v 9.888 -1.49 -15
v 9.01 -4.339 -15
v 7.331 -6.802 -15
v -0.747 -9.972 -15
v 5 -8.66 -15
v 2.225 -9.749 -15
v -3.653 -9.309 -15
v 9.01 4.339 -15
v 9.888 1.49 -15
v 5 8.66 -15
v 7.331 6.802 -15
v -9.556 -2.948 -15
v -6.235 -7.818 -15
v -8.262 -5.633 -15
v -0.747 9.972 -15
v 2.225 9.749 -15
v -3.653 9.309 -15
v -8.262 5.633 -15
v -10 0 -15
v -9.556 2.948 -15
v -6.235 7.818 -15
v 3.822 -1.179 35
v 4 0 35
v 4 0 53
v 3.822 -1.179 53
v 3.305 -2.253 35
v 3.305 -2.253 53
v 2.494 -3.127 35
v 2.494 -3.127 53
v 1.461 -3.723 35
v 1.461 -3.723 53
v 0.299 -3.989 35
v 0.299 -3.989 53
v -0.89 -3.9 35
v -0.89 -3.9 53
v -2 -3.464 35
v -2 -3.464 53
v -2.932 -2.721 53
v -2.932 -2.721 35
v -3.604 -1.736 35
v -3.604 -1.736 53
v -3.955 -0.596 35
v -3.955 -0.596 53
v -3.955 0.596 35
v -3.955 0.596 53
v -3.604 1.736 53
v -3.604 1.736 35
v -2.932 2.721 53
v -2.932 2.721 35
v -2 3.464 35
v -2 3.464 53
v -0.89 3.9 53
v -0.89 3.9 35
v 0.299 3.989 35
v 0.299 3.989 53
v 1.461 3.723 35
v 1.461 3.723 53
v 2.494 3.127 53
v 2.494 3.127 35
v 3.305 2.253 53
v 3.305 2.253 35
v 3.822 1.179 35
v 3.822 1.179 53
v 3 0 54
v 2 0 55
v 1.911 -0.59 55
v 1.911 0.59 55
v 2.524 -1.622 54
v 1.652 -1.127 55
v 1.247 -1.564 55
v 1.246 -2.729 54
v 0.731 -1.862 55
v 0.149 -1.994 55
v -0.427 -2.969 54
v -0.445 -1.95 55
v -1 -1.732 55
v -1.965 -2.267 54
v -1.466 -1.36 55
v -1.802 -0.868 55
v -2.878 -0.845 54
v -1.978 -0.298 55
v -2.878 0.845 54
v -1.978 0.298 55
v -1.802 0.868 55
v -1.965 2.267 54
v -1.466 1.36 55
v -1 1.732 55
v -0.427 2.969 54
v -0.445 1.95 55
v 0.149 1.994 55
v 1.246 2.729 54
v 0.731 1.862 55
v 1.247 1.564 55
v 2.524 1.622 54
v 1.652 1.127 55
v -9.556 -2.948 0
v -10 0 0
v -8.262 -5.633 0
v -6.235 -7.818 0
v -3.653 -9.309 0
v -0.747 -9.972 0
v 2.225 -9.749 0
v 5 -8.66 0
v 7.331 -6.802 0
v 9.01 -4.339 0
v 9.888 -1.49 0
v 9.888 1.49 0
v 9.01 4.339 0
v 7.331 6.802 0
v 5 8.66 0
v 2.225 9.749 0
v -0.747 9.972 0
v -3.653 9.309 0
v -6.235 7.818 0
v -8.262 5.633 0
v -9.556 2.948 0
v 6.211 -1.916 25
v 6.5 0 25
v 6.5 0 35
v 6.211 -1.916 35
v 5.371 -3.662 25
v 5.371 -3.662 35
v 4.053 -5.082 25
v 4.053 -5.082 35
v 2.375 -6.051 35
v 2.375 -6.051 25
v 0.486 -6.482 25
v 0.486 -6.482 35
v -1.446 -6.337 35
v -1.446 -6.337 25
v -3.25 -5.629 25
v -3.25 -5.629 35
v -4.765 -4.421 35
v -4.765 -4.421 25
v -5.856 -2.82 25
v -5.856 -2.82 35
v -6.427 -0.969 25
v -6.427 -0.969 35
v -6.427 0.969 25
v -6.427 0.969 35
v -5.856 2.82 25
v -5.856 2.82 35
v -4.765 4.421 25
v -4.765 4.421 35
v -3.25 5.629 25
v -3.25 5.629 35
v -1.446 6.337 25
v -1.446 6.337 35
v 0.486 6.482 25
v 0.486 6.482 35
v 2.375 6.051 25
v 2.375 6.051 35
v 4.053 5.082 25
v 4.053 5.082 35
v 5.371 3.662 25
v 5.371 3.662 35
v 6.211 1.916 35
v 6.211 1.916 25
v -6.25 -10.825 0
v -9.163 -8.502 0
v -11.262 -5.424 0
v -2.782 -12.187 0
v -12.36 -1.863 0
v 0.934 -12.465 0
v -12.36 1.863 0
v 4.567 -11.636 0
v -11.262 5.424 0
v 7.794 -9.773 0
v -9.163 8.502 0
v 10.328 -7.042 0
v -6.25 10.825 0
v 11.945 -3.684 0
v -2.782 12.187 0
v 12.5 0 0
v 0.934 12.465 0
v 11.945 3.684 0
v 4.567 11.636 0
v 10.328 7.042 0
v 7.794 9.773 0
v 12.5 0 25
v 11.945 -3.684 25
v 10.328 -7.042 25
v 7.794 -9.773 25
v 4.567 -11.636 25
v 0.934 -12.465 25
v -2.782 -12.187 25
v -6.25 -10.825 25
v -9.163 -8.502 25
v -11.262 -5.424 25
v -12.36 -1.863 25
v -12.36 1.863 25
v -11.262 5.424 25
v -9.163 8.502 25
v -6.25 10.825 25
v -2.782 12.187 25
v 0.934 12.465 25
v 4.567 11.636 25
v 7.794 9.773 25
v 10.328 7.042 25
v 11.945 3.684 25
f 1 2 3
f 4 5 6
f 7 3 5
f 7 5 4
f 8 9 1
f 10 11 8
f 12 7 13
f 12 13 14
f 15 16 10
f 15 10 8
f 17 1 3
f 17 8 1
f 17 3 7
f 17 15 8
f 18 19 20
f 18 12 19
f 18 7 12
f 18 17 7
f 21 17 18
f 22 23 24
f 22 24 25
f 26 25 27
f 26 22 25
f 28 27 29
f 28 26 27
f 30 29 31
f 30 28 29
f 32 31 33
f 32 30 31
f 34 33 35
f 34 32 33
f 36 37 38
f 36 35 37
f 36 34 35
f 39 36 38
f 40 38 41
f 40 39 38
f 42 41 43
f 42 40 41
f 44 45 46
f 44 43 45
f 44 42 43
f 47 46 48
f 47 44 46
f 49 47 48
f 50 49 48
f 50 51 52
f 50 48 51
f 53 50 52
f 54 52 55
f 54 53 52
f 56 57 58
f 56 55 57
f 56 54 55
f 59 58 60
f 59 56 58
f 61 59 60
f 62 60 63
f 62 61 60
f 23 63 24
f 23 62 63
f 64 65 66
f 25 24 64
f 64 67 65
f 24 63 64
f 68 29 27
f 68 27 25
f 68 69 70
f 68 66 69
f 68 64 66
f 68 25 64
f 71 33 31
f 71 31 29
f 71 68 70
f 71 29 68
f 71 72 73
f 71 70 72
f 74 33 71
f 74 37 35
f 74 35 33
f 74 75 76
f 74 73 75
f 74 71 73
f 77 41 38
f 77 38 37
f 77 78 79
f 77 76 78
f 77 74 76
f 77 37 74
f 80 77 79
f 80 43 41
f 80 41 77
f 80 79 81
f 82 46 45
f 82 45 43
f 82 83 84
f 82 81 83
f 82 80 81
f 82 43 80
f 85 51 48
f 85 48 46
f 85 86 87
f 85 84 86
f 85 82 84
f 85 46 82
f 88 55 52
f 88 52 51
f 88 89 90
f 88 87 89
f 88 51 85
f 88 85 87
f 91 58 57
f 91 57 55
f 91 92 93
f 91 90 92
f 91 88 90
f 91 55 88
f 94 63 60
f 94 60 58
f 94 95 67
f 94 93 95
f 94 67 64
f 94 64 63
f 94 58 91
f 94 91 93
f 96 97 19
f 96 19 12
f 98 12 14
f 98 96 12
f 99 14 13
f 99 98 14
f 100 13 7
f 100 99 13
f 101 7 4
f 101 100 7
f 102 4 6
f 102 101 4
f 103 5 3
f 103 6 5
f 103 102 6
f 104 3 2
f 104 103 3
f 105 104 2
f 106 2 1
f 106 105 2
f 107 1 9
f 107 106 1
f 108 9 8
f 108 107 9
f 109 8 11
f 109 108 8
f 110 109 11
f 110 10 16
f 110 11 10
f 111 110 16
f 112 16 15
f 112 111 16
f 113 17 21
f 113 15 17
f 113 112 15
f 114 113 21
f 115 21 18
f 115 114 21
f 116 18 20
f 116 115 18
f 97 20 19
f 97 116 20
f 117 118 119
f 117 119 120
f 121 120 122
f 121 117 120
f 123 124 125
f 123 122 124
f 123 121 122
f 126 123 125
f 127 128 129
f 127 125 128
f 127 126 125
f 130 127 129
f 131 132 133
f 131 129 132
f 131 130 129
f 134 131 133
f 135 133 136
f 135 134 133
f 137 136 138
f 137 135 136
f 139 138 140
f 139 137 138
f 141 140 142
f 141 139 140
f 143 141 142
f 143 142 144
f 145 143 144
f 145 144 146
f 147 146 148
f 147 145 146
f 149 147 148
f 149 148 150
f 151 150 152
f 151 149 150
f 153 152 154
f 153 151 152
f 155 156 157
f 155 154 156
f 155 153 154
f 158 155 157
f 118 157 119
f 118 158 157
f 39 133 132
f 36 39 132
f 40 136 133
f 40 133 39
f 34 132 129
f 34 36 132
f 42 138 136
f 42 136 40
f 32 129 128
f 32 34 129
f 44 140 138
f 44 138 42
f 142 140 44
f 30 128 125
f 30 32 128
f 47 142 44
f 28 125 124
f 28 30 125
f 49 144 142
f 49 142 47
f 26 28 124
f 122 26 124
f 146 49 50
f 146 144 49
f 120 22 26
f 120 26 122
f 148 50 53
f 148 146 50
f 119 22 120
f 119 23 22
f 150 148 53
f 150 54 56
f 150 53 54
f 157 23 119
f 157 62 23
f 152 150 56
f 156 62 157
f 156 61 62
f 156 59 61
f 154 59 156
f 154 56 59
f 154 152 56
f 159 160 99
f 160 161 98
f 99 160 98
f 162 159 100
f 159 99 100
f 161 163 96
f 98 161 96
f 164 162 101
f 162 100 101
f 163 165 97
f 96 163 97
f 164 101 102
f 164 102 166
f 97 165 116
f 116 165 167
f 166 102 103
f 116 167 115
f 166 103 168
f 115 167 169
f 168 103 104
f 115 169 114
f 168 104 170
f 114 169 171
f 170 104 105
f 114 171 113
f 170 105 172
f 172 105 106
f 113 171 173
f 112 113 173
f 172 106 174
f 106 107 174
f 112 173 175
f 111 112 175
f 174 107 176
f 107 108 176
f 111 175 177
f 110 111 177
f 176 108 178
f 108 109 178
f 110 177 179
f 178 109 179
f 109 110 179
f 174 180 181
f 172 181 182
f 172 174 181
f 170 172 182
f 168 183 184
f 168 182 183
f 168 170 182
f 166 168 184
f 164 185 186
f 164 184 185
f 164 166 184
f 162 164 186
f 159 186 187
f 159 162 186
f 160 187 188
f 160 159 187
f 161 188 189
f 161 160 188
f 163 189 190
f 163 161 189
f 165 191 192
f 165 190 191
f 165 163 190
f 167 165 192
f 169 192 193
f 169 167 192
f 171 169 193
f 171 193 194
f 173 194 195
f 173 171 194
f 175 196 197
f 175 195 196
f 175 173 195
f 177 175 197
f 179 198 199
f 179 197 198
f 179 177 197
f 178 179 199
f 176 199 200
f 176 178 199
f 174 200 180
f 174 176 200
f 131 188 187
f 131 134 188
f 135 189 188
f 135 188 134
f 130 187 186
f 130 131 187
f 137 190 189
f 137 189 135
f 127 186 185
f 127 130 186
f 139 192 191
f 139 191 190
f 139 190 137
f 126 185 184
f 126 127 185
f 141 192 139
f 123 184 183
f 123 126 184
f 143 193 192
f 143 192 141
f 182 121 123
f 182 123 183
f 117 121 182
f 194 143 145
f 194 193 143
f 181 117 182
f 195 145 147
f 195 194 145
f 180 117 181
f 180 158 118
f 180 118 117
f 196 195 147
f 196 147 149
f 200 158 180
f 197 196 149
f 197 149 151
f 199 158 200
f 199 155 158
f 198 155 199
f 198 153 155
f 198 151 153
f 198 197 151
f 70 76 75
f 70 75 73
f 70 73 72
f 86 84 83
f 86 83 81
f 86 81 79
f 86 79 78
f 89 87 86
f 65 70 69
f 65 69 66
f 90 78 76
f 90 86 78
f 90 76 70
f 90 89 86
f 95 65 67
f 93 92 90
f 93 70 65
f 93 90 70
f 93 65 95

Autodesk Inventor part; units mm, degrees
ref_plane "YZ Plane" through (0, 0, 0) normal (1, 0, 0) x (0, 1, 0)
ref_plane "XZ Plane" through (0, 0, 0) normal (0, 1, 0) x (-1, 0, 0)
ref_plane "XY Plane" through (0, 0, 0) normal (0, 0, 1) x (1, 0, 0)
sketch "Sketch1" plane through (0, 0, 0) normal (0, 0, 1) x (1, 0, 0)
  circle A0 centre (0, 0) radius 12.5
  dimension "d0" = 25
extrude "Extrusion1" add sketch "Sketch1" along normal blind 25
sketch "Sketch2" plane through (0, 0, 25) normal (0, 0, 1) x (1, 0, 0)
  circle A0 centre (0, 0) radius 6.5
  dimension "d3" = 13
extrude "Extrusion2" add sketch "Sketch2" along normal blind 10
sketch "Sketch3" plane through (0, 0, 35) normal (0, 0, 1) x (1, 0, 0)
  circle A0 centre (0, 0) radius 4
  dimension "d6" = 8
extrude "Extrusion3" add sketch "Sketch3" along normal blind 20
chamfer "Chamfer1" distance 2 angle 45 1 edges at (-4, 0, 55)
sketch "Sketch4" plane through (0, 0, 0) normal (0, 0, -1) x (-1, 0, 0)
  circle A0 centre (0, 0) radius 10
  dimension "d12" = 20
extrude "Extrusion4" add sketch "Sketch4" along normal blind 15
thread "Thread1" size "M14x2" class "6g" standard "ANSI Metric M Profile" full length
properties part number "dc motor"
